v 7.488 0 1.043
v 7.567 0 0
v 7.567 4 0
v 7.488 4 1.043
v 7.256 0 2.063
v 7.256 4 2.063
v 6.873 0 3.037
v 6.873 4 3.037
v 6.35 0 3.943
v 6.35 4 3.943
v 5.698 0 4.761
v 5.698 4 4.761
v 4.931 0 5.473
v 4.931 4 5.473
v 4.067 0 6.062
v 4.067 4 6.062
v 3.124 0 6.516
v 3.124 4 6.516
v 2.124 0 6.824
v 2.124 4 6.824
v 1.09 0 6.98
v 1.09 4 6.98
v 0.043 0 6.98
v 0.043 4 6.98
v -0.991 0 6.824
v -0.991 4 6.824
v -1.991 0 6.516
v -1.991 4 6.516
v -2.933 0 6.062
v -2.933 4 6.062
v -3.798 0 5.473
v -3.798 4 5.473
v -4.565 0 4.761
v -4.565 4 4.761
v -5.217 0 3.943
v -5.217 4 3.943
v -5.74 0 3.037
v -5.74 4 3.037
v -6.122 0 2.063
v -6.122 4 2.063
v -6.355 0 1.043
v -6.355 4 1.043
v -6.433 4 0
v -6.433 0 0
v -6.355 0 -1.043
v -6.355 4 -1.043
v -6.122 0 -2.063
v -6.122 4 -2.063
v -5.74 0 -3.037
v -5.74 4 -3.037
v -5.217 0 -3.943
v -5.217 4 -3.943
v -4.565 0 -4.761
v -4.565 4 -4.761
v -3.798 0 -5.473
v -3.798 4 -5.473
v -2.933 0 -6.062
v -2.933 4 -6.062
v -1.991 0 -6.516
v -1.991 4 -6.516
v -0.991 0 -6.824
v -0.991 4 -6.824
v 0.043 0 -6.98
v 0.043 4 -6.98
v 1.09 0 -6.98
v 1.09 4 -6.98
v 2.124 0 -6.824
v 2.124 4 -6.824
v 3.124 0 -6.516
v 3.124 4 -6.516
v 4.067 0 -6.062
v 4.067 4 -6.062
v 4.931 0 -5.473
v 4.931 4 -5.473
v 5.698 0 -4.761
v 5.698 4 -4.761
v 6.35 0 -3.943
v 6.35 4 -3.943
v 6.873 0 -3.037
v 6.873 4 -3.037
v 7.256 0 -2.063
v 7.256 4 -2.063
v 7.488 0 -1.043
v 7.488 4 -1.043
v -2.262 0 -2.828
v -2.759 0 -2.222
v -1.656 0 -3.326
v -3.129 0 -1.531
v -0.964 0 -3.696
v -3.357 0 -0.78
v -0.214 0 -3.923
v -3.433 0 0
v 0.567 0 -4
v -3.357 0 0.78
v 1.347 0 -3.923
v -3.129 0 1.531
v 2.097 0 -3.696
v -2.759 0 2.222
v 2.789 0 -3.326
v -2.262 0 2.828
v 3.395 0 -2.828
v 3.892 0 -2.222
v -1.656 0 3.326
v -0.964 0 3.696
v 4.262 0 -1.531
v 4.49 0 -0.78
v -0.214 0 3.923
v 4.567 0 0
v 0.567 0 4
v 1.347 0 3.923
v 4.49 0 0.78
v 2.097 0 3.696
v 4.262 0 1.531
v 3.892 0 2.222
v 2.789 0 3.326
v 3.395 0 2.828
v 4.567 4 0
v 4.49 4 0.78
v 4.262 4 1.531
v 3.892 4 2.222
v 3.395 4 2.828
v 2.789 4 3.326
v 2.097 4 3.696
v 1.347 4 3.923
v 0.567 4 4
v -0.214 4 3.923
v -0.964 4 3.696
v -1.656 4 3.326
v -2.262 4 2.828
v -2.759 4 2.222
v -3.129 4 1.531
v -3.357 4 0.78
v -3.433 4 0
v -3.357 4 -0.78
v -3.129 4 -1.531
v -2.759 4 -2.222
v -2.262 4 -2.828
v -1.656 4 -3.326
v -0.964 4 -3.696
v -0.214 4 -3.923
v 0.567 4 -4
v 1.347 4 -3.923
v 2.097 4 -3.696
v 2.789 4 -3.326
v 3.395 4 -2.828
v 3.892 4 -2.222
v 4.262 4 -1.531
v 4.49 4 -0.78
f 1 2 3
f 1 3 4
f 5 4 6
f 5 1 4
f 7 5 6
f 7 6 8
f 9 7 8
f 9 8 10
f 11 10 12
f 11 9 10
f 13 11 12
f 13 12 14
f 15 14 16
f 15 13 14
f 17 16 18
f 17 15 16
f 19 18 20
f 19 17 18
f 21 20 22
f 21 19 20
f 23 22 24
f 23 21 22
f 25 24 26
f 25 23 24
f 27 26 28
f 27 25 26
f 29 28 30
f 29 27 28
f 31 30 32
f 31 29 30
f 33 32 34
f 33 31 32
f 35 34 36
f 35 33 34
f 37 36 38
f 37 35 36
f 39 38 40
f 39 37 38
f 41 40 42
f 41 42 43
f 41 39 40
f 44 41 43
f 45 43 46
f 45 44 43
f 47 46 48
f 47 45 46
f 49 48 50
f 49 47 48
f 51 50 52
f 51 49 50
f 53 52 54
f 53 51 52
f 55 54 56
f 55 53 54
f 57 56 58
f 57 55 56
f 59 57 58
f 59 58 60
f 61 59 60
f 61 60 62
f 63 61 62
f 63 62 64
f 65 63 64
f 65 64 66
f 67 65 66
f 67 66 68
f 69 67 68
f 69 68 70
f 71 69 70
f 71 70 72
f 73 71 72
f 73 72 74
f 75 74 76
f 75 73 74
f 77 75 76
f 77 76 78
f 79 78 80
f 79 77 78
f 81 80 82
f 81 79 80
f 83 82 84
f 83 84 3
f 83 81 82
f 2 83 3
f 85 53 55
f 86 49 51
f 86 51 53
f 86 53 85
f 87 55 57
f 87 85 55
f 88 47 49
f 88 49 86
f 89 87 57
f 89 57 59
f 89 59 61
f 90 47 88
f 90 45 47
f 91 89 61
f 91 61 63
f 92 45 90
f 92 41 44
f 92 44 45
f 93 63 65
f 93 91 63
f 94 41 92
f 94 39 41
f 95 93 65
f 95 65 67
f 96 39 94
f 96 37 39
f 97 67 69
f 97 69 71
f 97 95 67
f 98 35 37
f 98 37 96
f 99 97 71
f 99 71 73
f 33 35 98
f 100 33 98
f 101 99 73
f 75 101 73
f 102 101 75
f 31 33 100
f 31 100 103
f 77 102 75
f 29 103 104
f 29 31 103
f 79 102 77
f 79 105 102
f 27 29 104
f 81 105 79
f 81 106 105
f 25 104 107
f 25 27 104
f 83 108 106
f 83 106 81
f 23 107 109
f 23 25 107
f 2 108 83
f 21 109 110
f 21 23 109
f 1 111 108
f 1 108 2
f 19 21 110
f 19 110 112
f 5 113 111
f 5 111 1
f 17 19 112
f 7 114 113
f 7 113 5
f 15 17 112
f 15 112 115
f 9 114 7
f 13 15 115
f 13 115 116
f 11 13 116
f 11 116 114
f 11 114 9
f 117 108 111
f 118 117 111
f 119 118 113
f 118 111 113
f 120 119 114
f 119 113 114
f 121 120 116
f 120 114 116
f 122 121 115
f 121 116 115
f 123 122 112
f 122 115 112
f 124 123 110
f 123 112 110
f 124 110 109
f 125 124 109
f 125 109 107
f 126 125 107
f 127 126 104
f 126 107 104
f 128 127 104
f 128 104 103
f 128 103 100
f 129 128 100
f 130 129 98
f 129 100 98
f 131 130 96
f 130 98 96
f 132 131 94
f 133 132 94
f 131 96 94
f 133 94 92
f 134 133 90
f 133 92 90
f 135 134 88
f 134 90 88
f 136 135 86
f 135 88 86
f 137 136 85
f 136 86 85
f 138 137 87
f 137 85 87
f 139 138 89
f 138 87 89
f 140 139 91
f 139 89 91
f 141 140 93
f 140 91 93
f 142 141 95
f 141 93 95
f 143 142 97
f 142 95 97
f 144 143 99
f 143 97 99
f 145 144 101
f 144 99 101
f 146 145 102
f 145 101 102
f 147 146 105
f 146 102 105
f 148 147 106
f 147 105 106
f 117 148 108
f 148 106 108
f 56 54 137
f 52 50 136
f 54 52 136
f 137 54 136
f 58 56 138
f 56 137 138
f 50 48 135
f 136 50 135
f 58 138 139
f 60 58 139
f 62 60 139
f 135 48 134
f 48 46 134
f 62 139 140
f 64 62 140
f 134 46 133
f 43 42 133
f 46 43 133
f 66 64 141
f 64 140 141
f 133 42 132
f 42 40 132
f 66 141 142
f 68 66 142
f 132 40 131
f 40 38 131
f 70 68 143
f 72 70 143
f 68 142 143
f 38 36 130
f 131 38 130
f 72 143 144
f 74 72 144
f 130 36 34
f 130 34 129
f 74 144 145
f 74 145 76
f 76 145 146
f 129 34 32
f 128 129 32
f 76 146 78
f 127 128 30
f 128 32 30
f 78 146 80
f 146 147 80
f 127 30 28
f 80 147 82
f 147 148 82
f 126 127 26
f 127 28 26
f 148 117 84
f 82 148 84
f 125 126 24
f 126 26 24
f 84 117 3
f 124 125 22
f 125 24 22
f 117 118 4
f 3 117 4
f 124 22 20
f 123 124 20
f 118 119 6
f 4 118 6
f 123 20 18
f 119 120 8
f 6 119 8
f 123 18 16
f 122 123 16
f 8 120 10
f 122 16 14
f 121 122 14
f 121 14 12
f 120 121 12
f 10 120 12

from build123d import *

# Parameters (mm, degrees)
F0_R     = 4
F1_DEPTH = 4.5
F0_R_2   = 7
F2_DEPTH = 4


with BuildPart() as f1:
    # F0 (on Front) → F1 (new body)
    with BuildSketch(Plane.XZ):
        with Locations((0.566548, 0)):
            Circle(F0_R)
    extrude(amount=-F1_DEPTH)


with BuildPart() as f2:
    # F0 (on Front) → F2 (new body)
    with BuildSketch(Plane.XZ):
        with Locations((0.566548, 0)):
            Circle(F0_R_2)
        with Locations((0.566548, 0)):
            Circle(F0_R, mode=Mode.SUBTRACT)
    extrude(amount=-F2_DEPTH)


solid = f2.part
